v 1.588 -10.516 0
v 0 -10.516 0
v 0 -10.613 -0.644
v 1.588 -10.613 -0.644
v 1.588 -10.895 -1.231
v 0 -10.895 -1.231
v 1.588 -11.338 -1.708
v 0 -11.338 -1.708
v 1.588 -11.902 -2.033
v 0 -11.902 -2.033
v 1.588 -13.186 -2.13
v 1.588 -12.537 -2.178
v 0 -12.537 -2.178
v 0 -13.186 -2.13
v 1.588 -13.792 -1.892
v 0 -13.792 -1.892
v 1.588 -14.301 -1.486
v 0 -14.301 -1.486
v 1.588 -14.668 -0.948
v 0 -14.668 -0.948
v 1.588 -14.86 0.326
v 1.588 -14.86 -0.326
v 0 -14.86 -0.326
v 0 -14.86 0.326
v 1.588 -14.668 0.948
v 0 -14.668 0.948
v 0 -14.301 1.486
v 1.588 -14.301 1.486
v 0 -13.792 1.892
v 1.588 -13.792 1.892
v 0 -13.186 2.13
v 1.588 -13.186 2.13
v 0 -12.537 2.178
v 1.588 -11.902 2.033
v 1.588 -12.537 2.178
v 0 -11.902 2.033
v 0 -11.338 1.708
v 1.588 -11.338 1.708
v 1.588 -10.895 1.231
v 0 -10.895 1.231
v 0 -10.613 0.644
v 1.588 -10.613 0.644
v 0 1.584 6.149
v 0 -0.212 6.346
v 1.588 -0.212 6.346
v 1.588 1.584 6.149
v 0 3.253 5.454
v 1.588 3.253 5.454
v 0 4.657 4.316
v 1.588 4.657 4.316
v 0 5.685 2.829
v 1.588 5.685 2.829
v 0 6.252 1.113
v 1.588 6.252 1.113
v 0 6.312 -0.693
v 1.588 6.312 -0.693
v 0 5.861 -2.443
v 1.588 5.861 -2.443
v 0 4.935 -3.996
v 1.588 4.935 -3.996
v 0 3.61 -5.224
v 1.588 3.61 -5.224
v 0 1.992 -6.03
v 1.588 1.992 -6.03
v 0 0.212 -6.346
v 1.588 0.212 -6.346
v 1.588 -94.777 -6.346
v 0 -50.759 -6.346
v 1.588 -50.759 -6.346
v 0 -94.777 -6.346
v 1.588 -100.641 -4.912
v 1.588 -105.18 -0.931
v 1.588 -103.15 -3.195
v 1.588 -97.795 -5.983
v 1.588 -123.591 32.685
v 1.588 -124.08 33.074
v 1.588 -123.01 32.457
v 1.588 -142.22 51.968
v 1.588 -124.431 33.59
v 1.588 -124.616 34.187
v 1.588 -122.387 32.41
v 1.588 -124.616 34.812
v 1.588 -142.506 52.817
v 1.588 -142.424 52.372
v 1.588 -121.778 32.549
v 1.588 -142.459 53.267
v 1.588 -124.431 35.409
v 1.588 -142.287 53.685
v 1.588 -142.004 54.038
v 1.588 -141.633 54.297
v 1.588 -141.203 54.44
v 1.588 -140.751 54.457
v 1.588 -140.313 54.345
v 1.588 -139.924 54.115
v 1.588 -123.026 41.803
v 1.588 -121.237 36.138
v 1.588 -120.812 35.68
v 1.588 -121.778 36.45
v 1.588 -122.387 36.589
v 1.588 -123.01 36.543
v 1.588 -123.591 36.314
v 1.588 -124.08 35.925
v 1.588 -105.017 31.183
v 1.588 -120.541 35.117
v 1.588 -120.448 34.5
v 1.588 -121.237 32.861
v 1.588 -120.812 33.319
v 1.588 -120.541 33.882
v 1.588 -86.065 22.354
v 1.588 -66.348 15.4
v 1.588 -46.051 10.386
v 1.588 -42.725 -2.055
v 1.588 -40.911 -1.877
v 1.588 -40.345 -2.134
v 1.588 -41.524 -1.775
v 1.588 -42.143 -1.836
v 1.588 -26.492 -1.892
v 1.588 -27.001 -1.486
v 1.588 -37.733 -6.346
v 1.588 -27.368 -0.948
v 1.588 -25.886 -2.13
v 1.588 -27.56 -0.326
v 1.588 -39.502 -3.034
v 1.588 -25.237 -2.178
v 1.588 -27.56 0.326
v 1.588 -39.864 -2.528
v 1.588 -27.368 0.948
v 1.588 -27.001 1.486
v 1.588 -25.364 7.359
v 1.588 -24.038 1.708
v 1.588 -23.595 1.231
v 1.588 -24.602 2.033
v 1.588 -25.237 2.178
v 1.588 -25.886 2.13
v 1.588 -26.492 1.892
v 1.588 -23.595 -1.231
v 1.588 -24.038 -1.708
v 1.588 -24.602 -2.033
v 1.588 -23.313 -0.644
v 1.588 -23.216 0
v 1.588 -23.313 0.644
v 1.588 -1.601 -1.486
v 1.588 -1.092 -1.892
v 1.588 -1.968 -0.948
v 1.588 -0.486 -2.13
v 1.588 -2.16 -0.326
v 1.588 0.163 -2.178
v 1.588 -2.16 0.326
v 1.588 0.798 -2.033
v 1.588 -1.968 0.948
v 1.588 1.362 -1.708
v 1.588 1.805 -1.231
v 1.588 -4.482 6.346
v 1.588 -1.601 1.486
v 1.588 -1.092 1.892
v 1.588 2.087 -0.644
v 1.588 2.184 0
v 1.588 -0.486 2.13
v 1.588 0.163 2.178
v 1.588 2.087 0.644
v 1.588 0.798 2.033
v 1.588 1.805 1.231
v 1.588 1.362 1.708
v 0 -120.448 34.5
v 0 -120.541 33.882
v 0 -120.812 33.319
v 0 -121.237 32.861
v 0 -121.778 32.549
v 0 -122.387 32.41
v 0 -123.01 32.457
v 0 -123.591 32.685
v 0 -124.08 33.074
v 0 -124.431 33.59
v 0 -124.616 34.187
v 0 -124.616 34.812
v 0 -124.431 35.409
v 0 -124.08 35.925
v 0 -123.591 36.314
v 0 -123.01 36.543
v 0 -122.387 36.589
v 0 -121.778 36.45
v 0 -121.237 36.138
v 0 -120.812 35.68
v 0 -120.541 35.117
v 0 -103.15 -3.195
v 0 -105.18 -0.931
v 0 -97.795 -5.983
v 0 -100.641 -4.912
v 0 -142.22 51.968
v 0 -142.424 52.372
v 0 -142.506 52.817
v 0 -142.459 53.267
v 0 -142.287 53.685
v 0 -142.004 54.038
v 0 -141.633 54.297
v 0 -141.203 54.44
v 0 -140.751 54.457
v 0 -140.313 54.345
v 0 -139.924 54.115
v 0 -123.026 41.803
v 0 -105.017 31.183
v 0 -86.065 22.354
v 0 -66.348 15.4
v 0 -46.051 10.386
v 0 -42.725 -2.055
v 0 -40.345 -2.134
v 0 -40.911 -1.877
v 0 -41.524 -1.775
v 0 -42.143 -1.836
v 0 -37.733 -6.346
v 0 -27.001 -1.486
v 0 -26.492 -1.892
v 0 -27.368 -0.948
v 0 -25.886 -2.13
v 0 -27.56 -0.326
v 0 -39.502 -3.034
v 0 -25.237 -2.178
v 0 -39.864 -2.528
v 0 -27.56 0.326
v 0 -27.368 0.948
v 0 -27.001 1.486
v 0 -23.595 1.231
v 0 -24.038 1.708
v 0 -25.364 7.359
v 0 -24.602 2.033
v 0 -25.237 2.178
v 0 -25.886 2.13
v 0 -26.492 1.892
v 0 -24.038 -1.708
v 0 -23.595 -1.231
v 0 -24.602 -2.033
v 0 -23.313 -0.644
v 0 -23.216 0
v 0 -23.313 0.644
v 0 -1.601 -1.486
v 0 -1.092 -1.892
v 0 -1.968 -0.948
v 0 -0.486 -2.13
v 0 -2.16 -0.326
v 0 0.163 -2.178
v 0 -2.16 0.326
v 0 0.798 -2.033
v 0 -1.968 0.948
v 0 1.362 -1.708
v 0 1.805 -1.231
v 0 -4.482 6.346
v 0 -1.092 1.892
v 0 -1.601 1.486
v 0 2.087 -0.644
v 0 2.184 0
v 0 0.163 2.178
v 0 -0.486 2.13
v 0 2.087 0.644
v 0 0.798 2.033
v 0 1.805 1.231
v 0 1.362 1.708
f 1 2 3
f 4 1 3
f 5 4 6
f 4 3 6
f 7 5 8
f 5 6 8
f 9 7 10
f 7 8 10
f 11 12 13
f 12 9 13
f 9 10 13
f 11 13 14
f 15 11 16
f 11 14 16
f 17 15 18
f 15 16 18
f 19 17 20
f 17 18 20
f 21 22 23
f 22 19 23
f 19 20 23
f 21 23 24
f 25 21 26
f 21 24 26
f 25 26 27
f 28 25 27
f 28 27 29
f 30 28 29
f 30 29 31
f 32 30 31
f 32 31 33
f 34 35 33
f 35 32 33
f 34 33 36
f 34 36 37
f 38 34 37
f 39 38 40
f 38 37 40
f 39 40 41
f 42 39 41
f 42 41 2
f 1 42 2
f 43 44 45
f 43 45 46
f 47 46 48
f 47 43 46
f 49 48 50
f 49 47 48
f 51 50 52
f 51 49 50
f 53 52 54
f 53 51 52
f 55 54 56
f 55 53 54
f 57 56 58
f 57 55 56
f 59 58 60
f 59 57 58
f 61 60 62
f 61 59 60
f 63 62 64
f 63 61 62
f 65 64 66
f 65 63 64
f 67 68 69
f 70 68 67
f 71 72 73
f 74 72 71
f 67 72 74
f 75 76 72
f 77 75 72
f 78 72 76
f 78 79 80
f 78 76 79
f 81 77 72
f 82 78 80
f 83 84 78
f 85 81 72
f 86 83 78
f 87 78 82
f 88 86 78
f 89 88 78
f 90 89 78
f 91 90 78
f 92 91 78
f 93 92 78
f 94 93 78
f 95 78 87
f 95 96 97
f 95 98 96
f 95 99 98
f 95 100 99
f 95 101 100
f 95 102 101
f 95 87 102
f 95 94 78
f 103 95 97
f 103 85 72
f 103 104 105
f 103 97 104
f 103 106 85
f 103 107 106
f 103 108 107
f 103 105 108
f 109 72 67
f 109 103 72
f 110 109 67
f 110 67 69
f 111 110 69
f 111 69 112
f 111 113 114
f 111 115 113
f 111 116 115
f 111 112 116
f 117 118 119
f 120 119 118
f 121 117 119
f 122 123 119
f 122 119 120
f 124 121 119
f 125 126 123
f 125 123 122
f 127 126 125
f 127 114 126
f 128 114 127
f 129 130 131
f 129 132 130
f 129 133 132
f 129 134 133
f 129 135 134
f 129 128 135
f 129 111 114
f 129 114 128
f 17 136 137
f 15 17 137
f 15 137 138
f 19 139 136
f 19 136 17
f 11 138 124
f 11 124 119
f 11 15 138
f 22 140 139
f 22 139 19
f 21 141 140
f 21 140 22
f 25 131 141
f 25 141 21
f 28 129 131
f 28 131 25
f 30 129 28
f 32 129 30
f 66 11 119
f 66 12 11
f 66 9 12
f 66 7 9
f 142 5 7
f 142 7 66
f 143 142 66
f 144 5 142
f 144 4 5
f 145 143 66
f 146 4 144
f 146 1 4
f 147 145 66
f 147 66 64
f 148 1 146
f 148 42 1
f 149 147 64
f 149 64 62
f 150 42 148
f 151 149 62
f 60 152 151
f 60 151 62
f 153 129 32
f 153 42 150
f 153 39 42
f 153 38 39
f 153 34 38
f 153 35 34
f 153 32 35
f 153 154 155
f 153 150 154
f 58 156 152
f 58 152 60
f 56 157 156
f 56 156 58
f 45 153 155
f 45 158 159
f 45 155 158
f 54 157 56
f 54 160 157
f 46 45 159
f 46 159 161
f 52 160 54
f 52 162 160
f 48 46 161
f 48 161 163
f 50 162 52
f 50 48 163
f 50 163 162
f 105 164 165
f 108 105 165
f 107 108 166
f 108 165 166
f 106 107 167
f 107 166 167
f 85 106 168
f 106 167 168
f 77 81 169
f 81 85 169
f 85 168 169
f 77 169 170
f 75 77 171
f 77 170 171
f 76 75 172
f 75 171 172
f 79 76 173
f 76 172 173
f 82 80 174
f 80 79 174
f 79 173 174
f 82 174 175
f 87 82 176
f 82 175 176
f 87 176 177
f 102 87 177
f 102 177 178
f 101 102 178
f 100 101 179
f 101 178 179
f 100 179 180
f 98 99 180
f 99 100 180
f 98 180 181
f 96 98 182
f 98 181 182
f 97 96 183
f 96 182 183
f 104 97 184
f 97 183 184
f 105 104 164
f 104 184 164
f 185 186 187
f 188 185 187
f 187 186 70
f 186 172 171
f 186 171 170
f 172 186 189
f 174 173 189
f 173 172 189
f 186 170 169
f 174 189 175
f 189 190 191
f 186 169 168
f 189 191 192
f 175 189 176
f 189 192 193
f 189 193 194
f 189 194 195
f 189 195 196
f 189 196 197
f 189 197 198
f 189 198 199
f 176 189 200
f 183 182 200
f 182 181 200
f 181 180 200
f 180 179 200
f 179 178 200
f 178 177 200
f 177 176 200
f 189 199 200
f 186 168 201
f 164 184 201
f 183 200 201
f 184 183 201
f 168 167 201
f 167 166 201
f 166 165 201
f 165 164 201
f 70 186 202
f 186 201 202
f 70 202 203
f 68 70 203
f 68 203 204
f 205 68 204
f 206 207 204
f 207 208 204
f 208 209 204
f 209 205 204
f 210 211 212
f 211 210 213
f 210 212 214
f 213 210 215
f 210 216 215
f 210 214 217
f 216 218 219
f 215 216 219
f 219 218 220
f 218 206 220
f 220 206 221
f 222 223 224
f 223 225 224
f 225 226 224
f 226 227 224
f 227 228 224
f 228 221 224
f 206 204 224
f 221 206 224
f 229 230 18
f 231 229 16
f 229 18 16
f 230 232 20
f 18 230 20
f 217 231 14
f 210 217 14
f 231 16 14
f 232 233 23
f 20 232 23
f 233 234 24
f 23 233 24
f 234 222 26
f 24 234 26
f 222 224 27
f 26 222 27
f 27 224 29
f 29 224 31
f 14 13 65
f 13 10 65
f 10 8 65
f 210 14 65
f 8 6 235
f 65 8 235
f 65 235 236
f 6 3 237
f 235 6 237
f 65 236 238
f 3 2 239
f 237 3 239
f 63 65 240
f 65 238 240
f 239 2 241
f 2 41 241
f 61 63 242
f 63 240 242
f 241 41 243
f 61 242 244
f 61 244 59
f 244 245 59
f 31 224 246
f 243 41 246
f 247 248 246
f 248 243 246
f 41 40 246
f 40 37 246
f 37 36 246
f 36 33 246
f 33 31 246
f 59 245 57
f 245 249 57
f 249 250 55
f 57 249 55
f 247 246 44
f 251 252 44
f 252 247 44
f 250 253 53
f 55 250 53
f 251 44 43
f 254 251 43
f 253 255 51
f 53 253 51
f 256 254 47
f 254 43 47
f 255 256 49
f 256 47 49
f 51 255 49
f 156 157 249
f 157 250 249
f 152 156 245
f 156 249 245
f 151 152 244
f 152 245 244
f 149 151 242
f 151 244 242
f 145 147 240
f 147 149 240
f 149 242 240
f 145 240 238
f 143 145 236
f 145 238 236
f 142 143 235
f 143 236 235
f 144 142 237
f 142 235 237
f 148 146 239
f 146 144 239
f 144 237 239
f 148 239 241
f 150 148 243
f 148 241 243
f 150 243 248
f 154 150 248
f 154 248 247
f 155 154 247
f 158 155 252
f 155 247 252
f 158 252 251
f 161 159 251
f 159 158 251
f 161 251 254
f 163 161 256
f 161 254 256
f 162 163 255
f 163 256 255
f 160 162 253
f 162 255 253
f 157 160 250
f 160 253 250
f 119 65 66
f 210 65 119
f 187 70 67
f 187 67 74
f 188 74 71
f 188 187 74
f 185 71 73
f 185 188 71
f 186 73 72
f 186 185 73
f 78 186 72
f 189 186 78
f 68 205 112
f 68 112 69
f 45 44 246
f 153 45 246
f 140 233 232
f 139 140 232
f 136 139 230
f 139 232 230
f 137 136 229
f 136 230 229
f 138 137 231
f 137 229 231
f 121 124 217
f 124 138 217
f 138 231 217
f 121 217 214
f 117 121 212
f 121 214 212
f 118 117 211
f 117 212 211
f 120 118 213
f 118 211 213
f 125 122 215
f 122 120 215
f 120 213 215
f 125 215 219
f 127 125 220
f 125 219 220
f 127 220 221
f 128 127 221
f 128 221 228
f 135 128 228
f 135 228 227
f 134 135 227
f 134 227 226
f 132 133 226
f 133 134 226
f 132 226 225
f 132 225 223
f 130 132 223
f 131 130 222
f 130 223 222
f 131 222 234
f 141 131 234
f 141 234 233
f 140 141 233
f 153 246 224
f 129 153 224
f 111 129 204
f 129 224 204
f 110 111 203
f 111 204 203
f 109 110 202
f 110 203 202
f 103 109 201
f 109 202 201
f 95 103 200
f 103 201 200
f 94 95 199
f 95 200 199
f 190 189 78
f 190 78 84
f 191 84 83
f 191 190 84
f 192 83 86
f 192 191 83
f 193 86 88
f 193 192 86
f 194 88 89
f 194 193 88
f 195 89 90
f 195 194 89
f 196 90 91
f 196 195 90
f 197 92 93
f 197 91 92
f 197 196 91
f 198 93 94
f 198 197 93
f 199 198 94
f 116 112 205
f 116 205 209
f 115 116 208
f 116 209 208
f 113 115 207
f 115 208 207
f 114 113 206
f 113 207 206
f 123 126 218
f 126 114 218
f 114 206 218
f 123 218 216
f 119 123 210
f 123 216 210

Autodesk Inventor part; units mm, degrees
ref_plane "YZ Plane" through (0, 0, 0) normal (1, 0, 0) x (0, 1, 0)
ref_plane "XZ Plane" through (0, 0, 0) normal (0, 1, 0) x (-1, 0, 0)
ref_plane "XY Plane" through (0, 0, 0) normal (0, 0, 1) x (1, 0, 0)
sketch "main" plane through (0, 0, 0) normal (0, 0, 1) x (1, 0, 0)
  circle A0 centre (44.5304, -90.8931) radius 2.1844
  circle A1 centre (57.2304, -90.8931) radius 2.1844
  arc A2 (57.4426, -97.2395) -> (57.0183, -84.5466) centre (57.2304, -90.8931) ccw
  line L0 (57.0183, -84.5466) -> (52.7487, -84.5466)
  arc A3 (-82.6932, -36.7784) -> (52.7487, -84.5466) centre (52.7487, 131.3534) ccw
  line L1 (57.4426, -97.2395) -> (-37.5462, -97.2395)
  line L2 (-47.9494, -91.8239) -> (-84.9895, -38.9252)
  arc A4 (-82.6932, -36.7784) -> (-84.9895, -38.9252) centre (-83.6891, -38.0147) ccw
  arc A5 (-47.9494, -91.8239) -> (-37.5462, -97.2395) centre (-37.5462, -84.5395) ccw
  circle A6 centre (31.8304, -90.8931) radius 2.1844
  point P0 (7.1274, -71.1865)
  point P1 (-92.1475, -28.7025)
  point P2 (-44.1574, -97.2395)
  dimension "d1" = 12.7
  dimension "d2" = 101.6
  dimension "d3" = 1.5875
  dimension "d4" = 12.7
  dimension "d7" = 64.5774
  dimension "d10" = 12.7
  dimension "d15" = 125
  dimension "d16" = 12.7
  dimension "d17" = 215.9
sketch "Sketch1" plane through (0, 0, 0) normal (1, 0, 0) x (0, 1, 0)
  arc A0 (-39.5025, -3.0335) -> (-42.7248, -2.0551) centre (-41.6029, -4.1554) ccw projected
  line L0 (-42.7248, -2.0551) -> (-52.3306, -7.186) projected
  line L1 (-39.5025, -3.0335) -> (-35.7298, -10.0964) projected
  circle A1 centre (-122.5435, 34.4996) radius 2.0955
  circle A2 centre (-12.7, 0) radius 2.1844
  circle A3 centre (0, 0) radius 2.1844
  arc A4 (0.2122, -6.3465) -> (-0.2122, 6.3465) centre (0, 0) ccw
  line L2 (-0.2122, 6.3465) -> (-4.4817, 6.3465)
  arc A5 (-139.9236, 54.1147) -> (-4.4817, 6.3465) centre (-4.4817, 222.2465) ccw
  line L3 (0.2122, -6.3465) -> (-94.7766, -6.3465)
  line L4 (-105.1799, -0.9309) -> (-142.2199, 51.9678)
  arc A6 (-139.9236, 54.1147) -> (-142.2199, 51.9678) centre (-140.9195, 52.8784) ccw
  arc A7 (-105.1799, -0.9309) -> (-94.7766, -6.3465) centre (-94.7766, 6.3535) ccw
  circle A8 centre (-25.4, 0) radius 2.1844
  point P0 (-50.7588, -6.3465)
  point P1 (-37.7329, -6.3465)
extrude "Extrusion1" add sketch "Sketch1" along normal blind 1.5875 contours A0 L0 L3 A7 L4 A6 A5 L2 A4 L1
properties part number "Ramp" material "Acetal Resin, White"
